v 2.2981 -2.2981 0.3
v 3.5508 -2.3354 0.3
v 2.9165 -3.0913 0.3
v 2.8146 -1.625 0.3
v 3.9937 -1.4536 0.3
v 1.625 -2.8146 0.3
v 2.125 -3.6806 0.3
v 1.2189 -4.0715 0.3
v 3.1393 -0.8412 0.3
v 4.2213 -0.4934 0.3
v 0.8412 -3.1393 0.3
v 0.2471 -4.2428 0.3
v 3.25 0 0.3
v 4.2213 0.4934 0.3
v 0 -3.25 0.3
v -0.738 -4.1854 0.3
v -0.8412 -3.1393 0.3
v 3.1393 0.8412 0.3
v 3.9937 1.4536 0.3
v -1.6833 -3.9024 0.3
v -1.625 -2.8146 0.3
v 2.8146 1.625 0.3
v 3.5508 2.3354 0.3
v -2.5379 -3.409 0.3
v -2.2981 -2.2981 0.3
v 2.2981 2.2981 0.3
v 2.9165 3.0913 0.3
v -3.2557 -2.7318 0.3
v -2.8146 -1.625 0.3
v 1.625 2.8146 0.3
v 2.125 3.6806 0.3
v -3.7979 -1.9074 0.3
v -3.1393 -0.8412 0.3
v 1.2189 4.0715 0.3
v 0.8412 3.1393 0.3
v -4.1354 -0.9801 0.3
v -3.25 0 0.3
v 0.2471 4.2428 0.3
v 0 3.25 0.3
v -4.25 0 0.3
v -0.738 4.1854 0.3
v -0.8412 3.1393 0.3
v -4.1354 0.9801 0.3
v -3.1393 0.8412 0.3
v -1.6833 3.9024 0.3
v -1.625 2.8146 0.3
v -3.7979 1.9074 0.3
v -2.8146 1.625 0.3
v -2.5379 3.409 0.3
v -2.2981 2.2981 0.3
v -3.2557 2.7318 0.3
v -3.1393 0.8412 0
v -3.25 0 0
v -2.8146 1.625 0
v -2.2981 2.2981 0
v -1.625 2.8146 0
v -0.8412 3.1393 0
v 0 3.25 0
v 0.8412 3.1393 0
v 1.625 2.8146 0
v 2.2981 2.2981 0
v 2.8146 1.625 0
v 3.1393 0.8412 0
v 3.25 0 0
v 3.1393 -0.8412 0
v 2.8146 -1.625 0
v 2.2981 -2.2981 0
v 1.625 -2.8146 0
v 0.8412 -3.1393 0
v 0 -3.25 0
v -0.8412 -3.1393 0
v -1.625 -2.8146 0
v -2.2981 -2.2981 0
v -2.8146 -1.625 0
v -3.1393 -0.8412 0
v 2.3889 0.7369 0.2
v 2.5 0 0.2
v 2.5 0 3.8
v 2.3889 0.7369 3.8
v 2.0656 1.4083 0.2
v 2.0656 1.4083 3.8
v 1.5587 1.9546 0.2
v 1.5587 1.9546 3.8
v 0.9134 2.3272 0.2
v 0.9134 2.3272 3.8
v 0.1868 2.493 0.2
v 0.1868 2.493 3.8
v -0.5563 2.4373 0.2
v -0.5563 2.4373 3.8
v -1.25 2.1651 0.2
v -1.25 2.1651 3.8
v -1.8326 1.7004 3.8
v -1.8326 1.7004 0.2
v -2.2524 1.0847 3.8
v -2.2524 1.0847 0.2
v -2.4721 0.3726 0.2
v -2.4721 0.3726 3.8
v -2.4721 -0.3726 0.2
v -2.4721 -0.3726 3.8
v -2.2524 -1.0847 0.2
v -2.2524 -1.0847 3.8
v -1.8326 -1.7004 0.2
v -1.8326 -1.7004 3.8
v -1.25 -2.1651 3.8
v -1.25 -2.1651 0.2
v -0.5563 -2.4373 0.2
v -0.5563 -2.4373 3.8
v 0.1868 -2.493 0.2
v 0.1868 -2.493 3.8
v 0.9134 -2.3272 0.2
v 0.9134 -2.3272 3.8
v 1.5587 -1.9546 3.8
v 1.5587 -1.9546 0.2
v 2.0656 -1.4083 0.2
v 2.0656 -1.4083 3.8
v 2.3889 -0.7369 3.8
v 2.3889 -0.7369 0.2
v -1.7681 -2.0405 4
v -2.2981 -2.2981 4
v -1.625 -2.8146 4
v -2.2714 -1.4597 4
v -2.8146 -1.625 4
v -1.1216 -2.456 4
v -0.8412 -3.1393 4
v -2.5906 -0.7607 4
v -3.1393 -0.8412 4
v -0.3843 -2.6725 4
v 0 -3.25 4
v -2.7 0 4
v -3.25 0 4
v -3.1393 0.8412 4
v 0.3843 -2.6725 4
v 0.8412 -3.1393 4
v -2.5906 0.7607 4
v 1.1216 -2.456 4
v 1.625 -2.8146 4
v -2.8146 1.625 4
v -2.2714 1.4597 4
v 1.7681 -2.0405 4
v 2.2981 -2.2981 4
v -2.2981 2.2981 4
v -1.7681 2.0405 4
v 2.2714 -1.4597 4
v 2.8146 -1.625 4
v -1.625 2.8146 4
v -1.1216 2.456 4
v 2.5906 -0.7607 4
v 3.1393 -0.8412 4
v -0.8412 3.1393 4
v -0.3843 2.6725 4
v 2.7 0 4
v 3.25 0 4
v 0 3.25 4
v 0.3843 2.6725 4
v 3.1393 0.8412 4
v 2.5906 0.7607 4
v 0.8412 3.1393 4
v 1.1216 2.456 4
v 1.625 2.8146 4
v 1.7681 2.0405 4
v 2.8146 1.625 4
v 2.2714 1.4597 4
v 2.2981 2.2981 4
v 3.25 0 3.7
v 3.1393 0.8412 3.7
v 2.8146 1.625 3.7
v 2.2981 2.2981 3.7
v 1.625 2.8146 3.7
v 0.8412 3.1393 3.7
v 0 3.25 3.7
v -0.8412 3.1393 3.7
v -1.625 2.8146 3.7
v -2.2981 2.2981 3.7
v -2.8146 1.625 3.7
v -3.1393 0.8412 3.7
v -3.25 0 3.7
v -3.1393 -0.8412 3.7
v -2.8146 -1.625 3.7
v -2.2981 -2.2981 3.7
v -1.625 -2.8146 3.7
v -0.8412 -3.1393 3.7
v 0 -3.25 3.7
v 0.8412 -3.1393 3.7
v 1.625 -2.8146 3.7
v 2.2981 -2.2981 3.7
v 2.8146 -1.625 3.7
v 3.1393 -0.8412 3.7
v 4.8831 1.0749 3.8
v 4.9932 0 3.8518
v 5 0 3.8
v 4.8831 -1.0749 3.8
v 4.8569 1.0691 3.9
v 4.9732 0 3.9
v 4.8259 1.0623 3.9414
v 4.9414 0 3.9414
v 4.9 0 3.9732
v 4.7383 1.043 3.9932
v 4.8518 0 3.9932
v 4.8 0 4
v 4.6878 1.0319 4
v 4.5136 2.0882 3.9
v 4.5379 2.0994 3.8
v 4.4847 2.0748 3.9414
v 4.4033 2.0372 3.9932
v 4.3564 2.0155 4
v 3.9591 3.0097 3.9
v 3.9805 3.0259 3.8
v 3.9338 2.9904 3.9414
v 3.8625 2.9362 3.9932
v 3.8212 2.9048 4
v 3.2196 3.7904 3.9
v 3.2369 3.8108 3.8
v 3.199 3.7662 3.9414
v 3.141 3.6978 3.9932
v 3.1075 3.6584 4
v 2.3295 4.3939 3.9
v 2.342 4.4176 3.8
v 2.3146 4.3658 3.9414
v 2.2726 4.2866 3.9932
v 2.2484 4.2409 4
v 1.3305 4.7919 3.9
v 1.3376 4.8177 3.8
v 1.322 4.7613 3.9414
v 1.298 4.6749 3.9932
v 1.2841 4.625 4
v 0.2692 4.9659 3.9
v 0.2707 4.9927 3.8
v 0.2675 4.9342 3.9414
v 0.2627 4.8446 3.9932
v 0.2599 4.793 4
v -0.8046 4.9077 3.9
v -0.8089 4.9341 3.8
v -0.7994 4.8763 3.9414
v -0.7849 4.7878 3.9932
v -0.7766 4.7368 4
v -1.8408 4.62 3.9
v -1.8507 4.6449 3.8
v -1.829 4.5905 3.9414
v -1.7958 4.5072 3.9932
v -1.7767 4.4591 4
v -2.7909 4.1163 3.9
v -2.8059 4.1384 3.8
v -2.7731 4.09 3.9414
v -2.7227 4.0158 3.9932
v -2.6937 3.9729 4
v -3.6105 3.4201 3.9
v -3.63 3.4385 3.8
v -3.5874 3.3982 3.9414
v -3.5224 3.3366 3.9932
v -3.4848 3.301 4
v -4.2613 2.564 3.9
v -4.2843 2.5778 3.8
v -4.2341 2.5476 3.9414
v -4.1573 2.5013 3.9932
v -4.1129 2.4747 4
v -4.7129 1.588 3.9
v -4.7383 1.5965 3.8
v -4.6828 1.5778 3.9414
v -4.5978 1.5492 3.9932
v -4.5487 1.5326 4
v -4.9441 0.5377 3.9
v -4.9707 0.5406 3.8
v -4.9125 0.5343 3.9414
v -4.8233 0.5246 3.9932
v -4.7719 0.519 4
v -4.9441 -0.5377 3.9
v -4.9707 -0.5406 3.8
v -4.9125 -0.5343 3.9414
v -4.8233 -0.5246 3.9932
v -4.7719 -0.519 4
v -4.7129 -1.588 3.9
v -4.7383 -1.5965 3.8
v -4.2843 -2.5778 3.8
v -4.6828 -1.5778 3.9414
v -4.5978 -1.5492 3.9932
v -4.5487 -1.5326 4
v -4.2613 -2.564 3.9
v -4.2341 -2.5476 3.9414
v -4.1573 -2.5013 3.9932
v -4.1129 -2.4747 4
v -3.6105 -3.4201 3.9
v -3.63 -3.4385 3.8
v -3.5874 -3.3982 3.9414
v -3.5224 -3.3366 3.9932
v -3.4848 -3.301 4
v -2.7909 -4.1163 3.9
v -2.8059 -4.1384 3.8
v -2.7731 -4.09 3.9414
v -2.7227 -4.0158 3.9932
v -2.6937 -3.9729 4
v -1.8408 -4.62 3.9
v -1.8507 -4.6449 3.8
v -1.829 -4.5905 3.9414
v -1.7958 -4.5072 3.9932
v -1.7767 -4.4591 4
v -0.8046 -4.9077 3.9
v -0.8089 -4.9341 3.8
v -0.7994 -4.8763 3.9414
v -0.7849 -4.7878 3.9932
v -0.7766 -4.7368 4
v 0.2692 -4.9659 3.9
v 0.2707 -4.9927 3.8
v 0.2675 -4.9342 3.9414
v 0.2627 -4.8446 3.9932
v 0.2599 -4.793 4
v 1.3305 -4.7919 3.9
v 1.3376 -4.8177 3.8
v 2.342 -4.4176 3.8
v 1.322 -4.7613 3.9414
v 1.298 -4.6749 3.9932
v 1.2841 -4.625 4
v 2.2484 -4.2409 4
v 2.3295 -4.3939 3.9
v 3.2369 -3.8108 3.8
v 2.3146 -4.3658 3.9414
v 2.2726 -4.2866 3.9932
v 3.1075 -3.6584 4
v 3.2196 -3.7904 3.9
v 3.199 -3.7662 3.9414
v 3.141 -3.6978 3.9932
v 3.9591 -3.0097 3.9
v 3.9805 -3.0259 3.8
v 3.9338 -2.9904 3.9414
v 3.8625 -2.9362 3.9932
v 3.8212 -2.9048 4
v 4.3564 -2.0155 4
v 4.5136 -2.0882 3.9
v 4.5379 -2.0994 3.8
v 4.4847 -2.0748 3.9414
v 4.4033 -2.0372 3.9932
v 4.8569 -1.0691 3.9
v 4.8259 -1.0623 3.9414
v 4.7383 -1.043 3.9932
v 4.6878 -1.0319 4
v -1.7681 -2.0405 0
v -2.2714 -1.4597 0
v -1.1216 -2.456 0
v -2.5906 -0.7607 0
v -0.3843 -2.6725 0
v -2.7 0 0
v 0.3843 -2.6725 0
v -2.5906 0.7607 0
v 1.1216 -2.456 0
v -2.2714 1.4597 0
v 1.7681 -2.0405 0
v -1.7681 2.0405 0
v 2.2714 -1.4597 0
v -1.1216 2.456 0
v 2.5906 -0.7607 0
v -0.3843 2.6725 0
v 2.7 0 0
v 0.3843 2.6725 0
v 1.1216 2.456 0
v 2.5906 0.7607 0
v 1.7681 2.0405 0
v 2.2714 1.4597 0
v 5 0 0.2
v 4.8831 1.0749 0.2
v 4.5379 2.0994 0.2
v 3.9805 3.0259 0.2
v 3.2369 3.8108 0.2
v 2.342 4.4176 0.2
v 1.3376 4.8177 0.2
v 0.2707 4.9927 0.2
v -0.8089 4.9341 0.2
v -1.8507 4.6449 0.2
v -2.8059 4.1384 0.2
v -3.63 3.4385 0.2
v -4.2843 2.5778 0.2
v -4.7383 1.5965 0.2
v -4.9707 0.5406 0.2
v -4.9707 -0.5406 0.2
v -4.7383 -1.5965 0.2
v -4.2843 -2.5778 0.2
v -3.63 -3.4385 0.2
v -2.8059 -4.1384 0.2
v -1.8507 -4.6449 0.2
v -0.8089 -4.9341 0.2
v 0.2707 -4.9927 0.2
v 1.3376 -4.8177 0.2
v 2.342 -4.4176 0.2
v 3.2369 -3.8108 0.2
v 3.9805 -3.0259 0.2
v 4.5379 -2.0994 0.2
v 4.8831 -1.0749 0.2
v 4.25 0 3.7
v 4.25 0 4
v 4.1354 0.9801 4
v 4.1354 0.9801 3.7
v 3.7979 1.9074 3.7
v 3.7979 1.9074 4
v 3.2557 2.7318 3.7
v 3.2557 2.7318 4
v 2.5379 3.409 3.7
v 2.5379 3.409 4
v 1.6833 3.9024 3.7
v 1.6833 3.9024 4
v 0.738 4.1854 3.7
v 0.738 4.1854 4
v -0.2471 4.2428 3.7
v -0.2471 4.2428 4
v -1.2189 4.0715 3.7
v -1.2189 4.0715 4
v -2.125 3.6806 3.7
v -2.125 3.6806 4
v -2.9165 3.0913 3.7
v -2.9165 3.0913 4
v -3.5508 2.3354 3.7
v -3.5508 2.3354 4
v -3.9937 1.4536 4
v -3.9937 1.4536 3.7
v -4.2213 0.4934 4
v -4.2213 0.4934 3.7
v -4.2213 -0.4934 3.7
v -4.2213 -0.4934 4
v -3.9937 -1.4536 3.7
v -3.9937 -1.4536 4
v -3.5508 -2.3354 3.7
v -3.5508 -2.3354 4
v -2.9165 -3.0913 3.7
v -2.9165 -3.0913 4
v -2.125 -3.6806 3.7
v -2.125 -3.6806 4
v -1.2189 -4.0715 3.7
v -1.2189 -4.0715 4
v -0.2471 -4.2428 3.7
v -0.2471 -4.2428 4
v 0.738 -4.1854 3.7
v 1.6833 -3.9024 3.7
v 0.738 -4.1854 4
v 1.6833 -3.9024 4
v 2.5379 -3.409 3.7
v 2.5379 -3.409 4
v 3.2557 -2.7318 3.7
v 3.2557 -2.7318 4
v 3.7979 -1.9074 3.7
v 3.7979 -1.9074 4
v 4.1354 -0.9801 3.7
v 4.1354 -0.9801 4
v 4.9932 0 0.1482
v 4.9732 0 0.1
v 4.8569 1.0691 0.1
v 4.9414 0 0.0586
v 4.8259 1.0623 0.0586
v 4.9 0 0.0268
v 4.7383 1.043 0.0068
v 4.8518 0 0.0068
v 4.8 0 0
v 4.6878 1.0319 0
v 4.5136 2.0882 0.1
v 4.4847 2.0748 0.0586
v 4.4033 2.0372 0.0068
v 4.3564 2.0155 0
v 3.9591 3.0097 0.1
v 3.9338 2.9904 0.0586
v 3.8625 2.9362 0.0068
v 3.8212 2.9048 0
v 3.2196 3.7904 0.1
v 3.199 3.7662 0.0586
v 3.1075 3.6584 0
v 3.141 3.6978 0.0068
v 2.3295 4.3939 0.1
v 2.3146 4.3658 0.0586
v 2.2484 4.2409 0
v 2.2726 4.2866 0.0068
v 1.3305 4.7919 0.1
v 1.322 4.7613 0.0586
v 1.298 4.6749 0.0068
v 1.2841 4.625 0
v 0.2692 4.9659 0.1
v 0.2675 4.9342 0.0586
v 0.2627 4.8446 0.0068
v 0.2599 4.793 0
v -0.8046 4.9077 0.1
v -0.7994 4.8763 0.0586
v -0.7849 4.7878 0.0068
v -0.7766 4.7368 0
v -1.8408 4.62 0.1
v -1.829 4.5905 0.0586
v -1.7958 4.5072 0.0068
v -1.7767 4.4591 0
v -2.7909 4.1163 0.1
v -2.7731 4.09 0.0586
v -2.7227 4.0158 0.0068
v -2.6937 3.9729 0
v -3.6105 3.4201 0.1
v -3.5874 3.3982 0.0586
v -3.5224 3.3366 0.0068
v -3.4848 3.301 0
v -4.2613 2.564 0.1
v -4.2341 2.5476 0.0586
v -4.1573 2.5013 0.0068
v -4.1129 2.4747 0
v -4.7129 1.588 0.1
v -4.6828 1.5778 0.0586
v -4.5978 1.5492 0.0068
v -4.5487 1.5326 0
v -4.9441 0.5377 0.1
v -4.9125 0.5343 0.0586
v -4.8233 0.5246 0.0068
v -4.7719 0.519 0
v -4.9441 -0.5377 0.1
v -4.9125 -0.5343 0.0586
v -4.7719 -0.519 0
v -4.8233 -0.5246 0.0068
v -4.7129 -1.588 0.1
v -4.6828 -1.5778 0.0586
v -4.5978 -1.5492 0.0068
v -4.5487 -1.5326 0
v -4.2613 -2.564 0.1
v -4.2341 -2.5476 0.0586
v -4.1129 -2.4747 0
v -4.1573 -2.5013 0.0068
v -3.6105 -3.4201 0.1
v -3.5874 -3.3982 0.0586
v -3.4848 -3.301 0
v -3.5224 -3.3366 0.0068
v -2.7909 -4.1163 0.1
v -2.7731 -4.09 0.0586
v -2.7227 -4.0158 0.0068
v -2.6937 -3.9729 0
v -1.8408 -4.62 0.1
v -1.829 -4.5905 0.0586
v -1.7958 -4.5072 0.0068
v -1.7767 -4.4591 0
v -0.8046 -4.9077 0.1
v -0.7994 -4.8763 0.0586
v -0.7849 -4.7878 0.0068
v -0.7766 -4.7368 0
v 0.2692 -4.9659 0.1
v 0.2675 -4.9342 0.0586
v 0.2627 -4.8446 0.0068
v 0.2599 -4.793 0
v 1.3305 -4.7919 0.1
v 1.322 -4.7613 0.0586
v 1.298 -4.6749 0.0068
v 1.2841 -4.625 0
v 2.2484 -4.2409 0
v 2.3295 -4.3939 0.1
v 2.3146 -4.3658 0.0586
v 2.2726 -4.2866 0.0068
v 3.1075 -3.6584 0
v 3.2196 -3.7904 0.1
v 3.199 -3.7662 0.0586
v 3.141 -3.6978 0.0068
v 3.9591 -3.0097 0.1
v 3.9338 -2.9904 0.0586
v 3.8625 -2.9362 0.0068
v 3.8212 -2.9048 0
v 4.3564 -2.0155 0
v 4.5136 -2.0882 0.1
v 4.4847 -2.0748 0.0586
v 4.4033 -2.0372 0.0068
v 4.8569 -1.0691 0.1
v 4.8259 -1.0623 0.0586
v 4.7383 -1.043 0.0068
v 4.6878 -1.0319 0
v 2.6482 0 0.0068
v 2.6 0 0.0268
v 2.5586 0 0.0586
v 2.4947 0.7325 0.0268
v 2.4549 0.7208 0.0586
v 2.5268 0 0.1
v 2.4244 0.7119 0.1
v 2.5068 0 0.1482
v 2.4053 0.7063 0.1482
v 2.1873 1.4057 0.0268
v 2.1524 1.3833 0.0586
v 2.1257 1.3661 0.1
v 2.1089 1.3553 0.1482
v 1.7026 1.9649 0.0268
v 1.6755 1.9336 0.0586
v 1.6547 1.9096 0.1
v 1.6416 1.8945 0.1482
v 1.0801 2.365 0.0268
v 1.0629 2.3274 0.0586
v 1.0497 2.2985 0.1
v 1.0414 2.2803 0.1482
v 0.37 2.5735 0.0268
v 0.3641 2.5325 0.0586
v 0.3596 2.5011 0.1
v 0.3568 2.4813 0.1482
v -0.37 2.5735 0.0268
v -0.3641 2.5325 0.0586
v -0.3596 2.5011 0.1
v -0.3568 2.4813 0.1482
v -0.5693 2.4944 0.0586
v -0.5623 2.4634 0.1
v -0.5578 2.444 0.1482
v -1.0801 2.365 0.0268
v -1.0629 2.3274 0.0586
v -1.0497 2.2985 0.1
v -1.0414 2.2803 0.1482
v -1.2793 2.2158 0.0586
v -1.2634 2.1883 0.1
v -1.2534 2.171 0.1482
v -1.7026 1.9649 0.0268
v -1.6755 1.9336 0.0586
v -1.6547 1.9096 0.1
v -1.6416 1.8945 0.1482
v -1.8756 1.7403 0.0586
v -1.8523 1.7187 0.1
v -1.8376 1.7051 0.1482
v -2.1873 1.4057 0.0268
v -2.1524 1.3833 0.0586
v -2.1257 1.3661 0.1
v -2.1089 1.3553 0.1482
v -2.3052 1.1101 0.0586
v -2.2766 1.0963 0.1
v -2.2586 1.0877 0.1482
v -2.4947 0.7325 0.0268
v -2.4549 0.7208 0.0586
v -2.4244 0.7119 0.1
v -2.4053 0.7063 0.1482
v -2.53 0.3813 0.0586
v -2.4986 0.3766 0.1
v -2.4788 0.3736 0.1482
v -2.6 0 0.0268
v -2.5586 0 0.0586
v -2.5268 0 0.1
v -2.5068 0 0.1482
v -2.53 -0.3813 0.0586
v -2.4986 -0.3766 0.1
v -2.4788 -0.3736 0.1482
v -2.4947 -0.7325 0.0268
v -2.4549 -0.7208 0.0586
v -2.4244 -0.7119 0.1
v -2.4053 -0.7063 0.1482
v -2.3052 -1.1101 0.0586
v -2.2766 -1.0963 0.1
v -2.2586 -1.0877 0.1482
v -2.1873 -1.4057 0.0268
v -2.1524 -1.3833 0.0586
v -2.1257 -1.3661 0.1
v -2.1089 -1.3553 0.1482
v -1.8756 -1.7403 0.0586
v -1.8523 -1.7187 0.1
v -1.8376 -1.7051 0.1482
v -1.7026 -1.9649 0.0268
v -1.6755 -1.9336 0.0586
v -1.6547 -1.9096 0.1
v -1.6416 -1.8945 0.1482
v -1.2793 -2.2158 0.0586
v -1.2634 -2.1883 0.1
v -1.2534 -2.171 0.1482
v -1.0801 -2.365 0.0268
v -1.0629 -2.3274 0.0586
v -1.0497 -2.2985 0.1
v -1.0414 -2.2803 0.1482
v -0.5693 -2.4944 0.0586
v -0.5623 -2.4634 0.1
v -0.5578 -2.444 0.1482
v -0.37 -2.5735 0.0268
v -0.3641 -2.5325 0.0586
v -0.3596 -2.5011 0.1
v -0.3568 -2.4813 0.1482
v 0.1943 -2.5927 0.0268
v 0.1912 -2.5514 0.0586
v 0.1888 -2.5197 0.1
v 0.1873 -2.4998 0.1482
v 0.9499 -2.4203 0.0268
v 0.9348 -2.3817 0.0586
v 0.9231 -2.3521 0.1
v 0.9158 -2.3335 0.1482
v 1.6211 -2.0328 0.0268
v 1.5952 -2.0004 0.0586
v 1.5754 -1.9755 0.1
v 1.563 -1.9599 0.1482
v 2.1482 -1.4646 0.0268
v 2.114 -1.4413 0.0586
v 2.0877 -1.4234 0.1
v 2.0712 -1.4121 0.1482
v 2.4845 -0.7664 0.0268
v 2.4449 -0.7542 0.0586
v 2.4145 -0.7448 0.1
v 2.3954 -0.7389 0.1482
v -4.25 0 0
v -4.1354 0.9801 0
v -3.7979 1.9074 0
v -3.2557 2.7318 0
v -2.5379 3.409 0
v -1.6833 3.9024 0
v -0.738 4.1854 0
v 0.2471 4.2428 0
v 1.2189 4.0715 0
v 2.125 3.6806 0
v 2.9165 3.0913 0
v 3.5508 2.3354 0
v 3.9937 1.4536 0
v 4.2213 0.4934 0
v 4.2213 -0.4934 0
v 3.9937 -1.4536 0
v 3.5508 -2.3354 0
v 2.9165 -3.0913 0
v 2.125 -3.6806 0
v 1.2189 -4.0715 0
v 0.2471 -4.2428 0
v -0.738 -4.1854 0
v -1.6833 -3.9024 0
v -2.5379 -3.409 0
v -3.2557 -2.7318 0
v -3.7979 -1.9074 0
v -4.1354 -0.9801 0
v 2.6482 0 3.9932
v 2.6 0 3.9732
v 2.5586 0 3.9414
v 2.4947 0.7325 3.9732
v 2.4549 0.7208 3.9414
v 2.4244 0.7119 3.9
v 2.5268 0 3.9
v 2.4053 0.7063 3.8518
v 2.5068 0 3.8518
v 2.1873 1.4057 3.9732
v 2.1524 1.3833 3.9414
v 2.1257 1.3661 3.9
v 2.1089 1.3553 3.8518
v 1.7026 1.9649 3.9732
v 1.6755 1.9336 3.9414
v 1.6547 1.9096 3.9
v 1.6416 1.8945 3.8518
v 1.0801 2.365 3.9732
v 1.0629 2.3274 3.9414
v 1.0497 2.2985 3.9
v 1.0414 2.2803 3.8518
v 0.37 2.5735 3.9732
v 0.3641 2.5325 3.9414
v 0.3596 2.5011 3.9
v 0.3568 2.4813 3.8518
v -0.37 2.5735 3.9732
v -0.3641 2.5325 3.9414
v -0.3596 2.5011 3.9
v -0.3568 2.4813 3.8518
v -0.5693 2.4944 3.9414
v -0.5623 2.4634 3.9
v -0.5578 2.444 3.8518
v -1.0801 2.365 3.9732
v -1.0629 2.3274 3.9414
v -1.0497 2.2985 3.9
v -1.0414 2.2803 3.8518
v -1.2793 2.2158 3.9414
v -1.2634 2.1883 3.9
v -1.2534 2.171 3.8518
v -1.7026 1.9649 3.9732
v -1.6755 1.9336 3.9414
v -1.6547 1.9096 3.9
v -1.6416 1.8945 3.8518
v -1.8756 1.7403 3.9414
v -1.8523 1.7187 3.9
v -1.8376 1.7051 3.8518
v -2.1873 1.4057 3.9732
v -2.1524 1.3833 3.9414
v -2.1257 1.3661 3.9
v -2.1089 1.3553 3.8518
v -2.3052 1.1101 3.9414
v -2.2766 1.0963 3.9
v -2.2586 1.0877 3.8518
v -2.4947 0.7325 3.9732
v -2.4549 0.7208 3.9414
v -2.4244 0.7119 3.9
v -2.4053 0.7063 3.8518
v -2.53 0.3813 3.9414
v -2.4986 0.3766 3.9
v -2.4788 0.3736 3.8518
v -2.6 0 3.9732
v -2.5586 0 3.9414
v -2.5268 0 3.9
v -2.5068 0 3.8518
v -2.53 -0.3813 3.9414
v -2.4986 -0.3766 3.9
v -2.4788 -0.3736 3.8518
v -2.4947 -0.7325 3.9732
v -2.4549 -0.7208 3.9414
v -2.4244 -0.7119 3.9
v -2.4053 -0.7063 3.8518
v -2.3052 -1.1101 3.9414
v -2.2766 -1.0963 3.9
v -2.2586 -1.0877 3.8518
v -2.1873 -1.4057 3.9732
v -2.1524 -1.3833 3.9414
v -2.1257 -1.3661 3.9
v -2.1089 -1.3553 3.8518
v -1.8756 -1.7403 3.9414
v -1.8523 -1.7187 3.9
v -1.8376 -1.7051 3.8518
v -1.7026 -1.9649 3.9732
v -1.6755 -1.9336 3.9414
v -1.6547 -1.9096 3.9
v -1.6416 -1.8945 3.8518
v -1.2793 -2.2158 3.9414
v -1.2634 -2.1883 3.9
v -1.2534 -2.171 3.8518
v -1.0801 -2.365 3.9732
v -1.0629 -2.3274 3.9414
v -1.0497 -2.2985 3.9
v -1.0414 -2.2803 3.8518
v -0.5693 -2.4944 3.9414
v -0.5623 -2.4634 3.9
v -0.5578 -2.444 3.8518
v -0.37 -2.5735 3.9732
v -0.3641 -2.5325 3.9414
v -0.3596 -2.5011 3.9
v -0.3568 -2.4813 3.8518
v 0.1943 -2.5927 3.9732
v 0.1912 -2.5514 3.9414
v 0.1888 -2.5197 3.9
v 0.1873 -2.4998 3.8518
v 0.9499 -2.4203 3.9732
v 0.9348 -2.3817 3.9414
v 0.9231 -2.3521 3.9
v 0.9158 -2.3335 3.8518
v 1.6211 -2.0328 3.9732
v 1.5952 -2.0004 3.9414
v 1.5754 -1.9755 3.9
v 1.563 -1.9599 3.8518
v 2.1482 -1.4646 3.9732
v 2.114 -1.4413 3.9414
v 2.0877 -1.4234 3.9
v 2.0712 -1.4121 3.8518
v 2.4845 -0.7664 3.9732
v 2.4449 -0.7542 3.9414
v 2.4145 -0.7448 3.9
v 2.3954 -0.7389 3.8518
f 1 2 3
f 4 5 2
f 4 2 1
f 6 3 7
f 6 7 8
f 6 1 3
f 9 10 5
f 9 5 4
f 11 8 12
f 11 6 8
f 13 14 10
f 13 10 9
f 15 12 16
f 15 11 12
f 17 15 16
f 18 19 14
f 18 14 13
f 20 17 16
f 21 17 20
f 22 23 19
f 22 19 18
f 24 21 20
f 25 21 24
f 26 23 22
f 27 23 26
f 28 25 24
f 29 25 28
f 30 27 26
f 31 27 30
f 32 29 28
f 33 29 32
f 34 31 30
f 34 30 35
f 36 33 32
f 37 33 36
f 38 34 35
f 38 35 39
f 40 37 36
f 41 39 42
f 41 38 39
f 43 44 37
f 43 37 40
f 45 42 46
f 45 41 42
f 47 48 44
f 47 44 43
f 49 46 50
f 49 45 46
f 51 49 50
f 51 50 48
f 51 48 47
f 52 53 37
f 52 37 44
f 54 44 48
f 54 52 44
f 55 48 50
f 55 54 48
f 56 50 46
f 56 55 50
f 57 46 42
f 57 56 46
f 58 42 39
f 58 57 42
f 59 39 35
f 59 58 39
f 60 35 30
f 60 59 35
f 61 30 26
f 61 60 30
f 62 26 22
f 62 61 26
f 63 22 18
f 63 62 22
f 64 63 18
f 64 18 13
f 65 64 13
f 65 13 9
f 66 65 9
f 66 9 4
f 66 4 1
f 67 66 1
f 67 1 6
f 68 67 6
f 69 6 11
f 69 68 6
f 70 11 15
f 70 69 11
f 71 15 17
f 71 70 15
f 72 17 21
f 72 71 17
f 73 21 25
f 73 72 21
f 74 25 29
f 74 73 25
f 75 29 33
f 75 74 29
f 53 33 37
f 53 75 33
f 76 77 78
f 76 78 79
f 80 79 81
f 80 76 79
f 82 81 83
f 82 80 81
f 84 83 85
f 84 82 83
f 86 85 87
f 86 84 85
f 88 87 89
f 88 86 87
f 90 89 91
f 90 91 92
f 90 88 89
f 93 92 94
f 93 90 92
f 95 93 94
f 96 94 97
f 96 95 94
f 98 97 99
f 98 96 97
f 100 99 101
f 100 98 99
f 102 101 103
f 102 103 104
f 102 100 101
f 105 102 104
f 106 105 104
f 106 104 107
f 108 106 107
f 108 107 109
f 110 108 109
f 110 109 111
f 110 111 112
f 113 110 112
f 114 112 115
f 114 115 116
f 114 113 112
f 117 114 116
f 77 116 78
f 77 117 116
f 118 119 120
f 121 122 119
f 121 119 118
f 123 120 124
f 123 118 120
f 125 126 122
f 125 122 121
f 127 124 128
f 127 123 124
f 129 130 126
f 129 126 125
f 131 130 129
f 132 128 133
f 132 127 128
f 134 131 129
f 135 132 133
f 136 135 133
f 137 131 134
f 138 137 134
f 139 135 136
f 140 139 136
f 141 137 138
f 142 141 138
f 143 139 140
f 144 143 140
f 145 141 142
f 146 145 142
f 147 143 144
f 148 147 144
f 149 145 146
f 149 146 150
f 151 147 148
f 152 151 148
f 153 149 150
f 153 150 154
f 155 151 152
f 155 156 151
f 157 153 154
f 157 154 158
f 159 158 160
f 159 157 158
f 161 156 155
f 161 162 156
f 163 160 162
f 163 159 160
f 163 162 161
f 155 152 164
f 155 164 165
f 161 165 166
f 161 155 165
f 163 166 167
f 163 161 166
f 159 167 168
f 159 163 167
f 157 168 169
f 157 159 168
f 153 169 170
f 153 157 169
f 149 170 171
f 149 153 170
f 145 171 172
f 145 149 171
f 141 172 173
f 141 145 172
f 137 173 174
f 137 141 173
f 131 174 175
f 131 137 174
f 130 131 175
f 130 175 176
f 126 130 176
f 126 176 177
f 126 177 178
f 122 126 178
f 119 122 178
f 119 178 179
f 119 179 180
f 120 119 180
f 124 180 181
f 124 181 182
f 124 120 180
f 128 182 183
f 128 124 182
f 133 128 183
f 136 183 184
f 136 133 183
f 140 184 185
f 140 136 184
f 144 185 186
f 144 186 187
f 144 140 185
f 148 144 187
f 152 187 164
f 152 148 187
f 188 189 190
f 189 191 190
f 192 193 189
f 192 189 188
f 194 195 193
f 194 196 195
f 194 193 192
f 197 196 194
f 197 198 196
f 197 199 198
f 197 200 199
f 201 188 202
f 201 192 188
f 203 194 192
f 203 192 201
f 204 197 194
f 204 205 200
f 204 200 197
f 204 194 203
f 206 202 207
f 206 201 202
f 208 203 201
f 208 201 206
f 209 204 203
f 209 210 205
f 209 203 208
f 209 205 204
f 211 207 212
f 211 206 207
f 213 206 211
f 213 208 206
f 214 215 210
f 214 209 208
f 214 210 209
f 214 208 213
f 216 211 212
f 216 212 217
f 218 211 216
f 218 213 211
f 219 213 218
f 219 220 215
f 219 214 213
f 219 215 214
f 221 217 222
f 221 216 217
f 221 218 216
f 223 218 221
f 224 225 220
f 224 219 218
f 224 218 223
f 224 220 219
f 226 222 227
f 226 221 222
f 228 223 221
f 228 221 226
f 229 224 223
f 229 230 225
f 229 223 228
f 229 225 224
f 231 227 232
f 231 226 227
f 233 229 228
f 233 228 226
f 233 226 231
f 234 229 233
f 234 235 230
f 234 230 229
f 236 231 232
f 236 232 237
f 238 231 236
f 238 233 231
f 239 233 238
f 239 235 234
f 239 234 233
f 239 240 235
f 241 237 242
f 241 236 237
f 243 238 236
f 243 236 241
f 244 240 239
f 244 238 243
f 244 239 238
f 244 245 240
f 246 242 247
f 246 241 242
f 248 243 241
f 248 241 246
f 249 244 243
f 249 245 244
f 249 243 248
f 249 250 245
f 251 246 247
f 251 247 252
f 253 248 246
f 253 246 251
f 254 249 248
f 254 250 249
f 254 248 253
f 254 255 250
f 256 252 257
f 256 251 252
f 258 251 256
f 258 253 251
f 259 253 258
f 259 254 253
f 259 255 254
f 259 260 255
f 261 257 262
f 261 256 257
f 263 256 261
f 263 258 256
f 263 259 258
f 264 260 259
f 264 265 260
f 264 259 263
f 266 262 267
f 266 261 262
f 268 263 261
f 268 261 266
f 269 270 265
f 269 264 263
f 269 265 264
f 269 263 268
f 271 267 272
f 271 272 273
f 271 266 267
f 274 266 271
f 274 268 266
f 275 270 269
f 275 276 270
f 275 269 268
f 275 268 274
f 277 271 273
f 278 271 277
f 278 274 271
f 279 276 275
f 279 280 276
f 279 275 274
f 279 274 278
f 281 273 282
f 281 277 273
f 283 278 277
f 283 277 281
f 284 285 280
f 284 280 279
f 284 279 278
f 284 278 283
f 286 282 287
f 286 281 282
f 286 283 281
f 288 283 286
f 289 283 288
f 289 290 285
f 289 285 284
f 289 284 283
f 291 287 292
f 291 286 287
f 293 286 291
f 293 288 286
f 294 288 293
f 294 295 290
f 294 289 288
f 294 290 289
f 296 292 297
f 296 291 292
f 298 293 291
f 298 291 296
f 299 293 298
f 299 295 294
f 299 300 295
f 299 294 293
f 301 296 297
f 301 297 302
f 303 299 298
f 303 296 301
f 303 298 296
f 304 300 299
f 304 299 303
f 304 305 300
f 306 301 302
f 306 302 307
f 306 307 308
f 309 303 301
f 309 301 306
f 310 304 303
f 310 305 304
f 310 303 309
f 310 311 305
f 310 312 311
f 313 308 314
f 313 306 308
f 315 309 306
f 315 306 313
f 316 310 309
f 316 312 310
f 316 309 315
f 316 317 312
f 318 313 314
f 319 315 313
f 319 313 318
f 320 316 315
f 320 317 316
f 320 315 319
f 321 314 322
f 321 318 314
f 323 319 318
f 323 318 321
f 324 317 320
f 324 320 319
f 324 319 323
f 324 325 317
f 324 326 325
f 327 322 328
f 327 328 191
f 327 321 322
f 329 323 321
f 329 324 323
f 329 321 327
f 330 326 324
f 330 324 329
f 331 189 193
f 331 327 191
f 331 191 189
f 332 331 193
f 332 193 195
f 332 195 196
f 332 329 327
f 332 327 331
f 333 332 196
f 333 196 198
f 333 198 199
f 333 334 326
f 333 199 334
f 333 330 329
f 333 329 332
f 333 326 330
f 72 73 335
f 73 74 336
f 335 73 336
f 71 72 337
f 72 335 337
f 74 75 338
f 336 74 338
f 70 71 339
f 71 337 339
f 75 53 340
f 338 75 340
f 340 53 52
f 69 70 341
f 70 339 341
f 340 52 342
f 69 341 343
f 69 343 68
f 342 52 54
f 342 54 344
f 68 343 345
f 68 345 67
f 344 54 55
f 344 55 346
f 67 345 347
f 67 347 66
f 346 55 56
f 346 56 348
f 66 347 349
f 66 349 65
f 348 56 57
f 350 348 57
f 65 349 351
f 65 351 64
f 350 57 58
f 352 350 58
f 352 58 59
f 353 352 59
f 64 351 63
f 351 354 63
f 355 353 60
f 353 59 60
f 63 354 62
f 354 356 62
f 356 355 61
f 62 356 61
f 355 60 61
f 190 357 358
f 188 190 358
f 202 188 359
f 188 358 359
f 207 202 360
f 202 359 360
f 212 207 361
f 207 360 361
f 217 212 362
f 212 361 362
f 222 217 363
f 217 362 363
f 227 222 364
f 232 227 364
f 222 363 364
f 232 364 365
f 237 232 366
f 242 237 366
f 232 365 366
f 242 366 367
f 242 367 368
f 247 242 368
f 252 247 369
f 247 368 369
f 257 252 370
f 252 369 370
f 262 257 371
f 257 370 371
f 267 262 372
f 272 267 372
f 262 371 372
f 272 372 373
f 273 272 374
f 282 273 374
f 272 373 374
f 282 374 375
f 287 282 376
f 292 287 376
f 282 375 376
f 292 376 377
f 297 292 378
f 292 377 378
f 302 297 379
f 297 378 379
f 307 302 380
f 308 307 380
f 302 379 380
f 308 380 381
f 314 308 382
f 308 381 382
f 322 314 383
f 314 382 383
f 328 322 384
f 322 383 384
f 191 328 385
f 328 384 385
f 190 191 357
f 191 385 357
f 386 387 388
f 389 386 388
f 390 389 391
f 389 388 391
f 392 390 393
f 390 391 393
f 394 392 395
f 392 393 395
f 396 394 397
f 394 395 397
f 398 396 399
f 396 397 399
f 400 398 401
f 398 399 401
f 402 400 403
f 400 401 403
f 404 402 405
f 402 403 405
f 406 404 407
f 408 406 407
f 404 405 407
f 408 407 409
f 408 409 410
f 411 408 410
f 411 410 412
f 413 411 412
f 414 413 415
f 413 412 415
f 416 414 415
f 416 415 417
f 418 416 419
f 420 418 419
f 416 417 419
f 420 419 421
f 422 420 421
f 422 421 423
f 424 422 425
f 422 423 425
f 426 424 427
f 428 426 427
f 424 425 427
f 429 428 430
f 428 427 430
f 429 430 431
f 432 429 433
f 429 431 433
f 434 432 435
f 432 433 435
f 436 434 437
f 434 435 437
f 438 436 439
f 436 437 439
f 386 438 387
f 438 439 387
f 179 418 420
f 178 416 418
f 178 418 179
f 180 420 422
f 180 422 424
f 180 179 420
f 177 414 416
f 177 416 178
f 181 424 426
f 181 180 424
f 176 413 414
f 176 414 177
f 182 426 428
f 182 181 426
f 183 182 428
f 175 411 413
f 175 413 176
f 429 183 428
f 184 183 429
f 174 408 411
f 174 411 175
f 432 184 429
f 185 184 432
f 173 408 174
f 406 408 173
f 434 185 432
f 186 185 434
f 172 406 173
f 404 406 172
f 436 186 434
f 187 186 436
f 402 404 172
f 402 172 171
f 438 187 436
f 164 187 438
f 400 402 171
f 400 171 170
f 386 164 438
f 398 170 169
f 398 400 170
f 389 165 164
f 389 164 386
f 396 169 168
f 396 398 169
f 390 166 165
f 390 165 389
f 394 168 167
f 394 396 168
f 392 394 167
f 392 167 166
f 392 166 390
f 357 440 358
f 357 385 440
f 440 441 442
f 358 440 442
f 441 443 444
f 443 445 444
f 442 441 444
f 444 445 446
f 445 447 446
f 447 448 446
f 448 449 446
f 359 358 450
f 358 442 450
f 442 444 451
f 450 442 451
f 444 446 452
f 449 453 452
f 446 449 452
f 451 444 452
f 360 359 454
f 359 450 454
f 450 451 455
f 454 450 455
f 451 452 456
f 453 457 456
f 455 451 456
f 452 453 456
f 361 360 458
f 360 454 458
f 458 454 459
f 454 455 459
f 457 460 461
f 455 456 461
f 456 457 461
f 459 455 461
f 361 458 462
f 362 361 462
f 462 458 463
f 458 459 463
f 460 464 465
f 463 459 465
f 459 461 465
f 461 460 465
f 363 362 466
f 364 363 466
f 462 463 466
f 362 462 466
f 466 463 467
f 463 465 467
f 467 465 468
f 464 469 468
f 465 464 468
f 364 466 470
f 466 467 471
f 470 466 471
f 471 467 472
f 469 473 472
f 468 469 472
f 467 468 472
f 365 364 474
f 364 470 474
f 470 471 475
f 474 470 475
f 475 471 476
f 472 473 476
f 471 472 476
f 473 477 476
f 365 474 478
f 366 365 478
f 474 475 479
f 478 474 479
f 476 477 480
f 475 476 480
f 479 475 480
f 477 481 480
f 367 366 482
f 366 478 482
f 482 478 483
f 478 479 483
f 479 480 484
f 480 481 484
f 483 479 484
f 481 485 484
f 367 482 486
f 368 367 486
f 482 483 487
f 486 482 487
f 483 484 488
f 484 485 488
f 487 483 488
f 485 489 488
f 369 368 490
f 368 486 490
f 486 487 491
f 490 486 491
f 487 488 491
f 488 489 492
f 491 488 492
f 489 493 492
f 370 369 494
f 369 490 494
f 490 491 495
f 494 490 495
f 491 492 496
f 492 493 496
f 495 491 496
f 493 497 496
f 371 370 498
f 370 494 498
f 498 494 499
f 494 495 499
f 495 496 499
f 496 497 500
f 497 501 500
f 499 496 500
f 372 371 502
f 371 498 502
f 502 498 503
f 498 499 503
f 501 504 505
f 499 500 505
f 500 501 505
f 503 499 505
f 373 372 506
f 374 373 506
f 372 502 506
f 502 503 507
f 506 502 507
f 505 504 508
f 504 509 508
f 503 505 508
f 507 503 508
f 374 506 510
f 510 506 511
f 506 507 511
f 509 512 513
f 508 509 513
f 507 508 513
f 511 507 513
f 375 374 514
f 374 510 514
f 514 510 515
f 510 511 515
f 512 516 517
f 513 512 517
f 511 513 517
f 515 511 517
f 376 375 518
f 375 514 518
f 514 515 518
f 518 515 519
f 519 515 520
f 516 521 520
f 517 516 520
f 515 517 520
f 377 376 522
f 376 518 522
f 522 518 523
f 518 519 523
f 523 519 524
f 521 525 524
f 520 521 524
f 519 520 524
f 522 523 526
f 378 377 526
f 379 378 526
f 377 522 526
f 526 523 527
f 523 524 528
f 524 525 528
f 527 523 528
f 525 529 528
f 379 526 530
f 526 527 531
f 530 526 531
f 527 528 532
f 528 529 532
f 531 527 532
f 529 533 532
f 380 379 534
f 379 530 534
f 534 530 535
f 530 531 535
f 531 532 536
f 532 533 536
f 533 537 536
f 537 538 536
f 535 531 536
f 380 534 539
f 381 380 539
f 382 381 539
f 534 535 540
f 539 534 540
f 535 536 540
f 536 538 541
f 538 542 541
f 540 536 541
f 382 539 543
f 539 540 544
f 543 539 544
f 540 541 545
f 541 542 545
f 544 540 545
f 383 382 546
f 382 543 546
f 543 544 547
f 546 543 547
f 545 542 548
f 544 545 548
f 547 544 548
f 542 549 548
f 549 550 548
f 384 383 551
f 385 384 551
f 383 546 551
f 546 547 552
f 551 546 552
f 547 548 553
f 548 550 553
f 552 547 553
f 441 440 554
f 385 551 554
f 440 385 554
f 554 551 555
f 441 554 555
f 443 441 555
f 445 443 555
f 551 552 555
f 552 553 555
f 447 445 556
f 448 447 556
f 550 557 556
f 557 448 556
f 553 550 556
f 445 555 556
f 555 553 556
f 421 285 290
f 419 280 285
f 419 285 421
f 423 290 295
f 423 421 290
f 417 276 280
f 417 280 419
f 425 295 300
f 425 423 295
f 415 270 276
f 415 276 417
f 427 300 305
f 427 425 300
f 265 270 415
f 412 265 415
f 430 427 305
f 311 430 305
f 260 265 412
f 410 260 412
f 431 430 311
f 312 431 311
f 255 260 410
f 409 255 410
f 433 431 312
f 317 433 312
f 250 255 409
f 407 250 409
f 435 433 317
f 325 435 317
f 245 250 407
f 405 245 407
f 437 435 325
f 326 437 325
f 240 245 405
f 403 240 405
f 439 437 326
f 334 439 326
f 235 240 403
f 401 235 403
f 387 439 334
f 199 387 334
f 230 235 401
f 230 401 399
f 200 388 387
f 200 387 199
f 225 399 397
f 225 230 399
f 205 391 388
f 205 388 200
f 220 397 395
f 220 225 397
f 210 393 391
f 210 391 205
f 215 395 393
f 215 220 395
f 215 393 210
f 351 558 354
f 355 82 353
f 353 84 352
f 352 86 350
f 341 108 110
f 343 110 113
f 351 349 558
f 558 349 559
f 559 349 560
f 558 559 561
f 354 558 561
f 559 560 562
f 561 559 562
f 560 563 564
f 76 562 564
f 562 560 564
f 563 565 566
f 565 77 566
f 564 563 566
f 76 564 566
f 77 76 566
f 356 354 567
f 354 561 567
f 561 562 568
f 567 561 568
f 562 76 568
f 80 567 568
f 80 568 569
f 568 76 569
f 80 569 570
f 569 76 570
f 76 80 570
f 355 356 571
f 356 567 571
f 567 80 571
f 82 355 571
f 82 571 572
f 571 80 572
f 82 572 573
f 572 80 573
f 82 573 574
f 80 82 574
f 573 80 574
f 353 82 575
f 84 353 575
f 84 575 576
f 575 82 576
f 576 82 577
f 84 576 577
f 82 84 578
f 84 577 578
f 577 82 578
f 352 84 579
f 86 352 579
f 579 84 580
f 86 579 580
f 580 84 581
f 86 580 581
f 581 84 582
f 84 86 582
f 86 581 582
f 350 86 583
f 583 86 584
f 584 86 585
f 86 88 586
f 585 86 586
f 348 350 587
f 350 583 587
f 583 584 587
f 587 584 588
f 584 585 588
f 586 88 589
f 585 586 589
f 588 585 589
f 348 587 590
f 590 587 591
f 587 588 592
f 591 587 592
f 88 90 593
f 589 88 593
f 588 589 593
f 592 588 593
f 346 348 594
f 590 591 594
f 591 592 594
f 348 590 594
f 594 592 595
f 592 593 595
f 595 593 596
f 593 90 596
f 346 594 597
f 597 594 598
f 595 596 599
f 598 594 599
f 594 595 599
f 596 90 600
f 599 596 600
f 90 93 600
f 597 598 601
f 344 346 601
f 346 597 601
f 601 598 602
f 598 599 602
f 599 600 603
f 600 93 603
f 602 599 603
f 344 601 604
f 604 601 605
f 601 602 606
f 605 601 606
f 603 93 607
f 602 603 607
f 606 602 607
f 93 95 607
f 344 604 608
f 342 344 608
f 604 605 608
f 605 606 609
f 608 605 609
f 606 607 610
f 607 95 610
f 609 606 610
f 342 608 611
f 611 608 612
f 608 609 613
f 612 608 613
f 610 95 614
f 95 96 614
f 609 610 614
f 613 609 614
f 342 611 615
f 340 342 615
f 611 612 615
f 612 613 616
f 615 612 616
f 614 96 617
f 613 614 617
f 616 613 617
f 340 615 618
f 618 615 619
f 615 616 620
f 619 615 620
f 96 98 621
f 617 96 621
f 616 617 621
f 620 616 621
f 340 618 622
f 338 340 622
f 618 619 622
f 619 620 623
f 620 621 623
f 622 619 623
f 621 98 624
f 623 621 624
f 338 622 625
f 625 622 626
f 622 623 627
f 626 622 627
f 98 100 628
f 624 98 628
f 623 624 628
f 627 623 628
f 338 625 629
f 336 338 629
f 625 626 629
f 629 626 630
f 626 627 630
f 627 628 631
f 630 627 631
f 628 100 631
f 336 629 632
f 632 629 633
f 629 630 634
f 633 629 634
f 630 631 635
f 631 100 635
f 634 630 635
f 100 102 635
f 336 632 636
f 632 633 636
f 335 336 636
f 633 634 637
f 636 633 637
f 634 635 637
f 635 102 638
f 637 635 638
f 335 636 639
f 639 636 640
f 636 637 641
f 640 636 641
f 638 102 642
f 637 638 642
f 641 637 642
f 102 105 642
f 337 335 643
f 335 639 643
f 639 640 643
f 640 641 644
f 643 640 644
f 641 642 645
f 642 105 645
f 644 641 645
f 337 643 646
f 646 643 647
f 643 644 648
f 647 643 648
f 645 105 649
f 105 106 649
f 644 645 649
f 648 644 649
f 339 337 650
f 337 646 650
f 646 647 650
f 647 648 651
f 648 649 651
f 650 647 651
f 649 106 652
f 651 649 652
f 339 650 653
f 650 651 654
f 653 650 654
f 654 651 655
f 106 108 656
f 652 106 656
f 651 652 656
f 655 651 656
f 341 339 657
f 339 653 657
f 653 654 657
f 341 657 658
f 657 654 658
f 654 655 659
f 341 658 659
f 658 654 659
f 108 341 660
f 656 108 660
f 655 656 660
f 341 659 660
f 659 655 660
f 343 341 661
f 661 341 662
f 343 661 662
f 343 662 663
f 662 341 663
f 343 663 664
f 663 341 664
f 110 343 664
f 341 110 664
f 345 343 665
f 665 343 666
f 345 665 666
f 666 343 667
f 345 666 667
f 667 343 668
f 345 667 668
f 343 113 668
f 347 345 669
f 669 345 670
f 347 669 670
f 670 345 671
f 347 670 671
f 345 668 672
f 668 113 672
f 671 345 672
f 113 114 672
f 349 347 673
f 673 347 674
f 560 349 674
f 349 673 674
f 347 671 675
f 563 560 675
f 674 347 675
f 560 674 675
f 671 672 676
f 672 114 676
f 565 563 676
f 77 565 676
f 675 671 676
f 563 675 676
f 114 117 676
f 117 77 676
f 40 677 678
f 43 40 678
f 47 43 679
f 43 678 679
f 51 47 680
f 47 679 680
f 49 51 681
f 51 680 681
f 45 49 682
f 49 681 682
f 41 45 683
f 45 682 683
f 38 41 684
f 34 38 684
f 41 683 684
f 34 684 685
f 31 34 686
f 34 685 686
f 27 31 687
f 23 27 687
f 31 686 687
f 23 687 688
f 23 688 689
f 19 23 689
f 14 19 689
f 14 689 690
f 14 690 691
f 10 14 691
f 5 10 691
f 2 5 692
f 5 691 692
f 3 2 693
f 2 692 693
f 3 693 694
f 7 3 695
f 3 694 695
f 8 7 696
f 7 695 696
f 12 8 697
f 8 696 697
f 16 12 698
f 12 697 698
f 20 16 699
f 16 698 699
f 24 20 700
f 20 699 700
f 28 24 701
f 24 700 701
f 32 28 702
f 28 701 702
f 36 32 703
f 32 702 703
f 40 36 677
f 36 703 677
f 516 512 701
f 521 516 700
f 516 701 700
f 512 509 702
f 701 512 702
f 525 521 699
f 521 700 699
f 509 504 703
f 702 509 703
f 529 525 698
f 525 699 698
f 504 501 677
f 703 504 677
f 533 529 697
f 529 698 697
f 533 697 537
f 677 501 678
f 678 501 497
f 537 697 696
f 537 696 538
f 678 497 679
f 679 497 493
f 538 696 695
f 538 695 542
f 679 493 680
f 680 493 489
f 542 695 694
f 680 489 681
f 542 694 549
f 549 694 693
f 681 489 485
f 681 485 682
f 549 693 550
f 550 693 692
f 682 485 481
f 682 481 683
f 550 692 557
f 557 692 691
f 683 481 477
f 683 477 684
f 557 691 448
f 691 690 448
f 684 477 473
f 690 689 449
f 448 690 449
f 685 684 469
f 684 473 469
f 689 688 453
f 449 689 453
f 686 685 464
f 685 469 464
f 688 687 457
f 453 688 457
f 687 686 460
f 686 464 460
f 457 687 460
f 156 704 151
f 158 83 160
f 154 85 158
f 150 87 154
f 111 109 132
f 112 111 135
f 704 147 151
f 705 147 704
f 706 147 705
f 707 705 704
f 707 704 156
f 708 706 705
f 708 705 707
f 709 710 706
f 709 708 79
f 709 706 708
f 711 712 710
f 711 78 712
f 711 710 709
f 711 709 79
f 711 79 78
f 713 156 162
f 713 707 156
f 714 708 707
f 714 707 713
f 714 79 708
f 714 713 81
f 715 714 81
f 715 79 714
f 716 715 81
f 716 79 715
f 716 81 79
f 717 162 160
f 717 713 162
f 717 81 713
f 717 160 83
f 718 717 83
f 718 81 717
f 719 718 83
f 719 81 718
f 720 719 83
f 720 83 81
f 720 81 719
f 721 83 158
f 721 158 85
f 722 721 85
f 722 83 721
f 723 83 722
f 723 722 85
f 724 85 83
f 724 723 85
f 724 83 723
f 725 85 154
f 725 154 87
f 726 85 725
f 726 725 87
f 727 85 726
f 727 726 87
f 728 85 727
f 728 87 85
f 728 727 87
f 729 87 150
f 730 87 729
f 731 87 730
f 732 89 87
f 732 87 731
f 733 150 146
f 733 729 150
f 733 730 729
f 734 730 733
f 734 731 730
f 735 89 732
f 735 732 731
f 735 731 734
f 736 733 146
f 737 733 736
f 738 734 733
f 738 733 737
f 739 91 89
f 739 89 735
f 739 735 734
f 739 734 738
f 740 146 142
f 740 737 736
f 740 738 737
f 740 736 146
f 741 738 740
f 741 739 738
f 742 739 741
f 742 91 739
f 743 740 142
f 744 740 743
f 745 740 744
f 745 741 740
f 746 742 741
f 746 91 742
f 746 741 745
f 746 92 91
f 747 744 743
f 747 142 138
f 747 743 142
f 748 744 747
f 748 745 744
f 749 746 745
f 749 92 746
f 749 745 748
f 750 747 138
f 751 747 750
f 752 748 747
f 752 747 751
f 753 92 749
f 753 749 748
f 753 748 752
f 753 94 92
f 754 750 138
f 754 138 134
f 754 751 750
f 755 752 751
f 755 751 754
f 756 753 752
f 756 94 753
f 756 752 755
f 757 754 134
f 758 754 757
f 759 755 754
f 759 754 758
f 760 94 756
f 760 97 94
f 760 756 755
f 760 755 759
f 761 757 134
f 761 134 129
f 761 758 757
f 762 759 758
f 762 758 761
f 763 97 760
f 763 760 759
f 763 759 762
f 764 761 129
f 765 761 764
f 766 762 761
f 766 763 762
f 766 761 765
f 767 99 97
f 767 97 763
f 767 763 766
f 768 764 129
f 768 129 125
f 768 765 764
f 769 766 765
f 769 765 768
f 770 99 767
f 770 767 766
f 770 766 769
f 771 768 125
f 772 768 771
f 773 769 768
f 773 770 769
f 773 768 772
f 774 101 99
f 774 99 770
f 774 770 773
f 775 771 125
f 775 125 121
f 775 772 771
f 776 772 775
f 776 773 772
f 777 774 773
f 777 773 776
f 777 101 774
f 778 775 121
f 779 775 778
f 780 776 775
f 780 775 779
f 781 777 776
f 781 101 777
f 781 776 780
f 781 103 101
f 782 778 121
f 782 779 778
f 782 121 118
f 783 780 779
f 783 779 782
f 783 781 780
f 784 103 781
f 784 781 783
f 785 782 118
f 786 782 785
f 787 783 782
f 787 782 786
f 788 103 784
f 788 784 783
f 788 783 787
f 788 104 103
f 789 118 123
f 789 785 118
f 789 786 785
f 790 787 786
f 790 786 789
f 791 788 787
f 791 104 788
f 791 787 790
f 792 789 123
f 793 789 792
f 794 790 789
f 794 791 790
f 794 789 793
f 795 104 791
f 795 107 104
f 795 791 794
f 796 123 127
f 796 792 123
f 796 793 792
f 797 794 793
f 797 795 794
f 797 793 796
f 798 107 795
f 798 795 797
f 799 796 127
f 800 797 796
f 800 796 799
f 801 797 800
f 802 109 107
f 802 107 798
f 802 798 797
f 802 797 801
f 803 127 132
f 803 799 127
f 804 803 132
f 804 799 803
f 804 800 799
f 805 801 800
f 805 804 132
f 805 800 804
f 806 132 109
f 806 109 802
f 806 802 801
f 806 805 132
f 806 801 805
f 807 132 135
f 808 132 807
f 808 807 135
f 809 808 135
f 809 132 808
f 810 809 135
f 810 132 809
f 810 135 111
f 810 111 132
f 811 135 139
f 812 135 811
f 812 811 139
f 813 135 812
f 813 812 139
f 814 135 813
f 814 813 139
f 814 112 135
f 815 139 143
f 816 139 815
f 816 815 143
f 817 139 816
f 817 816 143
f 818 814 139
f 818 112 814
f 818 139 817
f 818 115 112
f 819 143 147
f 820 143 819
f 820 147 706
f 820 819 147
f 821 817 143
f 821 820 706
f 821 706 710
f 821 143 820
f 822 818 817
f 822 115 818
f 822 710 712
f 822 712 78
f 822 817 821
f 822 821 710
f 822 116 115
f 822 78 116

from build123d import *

# Parameters (mm, degrees)
SKETCH_1_R          = 5
SKETCH_1_R_2        = 2.5
EXTRUDE_1_DEPTH     = 4
SKETCH_4_R          = 4.25
SKETCH_4_R_2        = 3.25
CUT_EXTRUDE_3_DEPTH = 0.3
SKETCH_5_R          = 4.25
SKETCH_5_R_2        = 3.25
CUT_EXTRUDE_4_DEPTH = 0.3
FILLET_2_R          = 0.2


with BuildPart() as part:
    # Эскиз1 → Бобышка-Вытянуть1 (new body)
    with BuildSketch(Plane.XY):
        Circle(SKETCH_1_R)
        Circle(SKETCH_1_R_2, mode=Mode.SUBTRACT)
    extrude(amount=EXTRUDE_1_DEPTH)

    # Эскиз4 → Вырез-Вытянуть3 (cut)
    with BuildSketch(Plane.XY.offset(4)):
        Circle(SKETCH_4_R)
        Circle(SKETCH_4_R_2, mode=Mode.SUBTRACT)
    extrude(amount=-CUT_EXTRUDE_3_DEPTH, mode=Mode.SUBTRACT)

    # Эскиз5 → Вырез-Вытянуть4 (cut)
    with BuildSketch(Plane(origin=(0, 0, 0), x_dir=(-1, 0, 0), z_dir=(0, 0, -1))):
        Circle(SKETCH_5_R)
        Circle(SKETCH_5_R_2, mode=Mode.SUBTRACT)
    extrude(amount=-CUT_EXTRUDE_4_DEPTH, mode=Mode.SUBTRACT)

    # Скругление2
    fillet_2_edges = [part.edges().sort_by_distance(p)[0] for p in [
        (-5, 0, 4),
        (-5, 0, 0),
        (-2.5, 0, 0),
        (-2.5, 0, 4),
    ]]
    fillet(fillet_2_edges, radius=FILLET_2_R)


solid = part.part
